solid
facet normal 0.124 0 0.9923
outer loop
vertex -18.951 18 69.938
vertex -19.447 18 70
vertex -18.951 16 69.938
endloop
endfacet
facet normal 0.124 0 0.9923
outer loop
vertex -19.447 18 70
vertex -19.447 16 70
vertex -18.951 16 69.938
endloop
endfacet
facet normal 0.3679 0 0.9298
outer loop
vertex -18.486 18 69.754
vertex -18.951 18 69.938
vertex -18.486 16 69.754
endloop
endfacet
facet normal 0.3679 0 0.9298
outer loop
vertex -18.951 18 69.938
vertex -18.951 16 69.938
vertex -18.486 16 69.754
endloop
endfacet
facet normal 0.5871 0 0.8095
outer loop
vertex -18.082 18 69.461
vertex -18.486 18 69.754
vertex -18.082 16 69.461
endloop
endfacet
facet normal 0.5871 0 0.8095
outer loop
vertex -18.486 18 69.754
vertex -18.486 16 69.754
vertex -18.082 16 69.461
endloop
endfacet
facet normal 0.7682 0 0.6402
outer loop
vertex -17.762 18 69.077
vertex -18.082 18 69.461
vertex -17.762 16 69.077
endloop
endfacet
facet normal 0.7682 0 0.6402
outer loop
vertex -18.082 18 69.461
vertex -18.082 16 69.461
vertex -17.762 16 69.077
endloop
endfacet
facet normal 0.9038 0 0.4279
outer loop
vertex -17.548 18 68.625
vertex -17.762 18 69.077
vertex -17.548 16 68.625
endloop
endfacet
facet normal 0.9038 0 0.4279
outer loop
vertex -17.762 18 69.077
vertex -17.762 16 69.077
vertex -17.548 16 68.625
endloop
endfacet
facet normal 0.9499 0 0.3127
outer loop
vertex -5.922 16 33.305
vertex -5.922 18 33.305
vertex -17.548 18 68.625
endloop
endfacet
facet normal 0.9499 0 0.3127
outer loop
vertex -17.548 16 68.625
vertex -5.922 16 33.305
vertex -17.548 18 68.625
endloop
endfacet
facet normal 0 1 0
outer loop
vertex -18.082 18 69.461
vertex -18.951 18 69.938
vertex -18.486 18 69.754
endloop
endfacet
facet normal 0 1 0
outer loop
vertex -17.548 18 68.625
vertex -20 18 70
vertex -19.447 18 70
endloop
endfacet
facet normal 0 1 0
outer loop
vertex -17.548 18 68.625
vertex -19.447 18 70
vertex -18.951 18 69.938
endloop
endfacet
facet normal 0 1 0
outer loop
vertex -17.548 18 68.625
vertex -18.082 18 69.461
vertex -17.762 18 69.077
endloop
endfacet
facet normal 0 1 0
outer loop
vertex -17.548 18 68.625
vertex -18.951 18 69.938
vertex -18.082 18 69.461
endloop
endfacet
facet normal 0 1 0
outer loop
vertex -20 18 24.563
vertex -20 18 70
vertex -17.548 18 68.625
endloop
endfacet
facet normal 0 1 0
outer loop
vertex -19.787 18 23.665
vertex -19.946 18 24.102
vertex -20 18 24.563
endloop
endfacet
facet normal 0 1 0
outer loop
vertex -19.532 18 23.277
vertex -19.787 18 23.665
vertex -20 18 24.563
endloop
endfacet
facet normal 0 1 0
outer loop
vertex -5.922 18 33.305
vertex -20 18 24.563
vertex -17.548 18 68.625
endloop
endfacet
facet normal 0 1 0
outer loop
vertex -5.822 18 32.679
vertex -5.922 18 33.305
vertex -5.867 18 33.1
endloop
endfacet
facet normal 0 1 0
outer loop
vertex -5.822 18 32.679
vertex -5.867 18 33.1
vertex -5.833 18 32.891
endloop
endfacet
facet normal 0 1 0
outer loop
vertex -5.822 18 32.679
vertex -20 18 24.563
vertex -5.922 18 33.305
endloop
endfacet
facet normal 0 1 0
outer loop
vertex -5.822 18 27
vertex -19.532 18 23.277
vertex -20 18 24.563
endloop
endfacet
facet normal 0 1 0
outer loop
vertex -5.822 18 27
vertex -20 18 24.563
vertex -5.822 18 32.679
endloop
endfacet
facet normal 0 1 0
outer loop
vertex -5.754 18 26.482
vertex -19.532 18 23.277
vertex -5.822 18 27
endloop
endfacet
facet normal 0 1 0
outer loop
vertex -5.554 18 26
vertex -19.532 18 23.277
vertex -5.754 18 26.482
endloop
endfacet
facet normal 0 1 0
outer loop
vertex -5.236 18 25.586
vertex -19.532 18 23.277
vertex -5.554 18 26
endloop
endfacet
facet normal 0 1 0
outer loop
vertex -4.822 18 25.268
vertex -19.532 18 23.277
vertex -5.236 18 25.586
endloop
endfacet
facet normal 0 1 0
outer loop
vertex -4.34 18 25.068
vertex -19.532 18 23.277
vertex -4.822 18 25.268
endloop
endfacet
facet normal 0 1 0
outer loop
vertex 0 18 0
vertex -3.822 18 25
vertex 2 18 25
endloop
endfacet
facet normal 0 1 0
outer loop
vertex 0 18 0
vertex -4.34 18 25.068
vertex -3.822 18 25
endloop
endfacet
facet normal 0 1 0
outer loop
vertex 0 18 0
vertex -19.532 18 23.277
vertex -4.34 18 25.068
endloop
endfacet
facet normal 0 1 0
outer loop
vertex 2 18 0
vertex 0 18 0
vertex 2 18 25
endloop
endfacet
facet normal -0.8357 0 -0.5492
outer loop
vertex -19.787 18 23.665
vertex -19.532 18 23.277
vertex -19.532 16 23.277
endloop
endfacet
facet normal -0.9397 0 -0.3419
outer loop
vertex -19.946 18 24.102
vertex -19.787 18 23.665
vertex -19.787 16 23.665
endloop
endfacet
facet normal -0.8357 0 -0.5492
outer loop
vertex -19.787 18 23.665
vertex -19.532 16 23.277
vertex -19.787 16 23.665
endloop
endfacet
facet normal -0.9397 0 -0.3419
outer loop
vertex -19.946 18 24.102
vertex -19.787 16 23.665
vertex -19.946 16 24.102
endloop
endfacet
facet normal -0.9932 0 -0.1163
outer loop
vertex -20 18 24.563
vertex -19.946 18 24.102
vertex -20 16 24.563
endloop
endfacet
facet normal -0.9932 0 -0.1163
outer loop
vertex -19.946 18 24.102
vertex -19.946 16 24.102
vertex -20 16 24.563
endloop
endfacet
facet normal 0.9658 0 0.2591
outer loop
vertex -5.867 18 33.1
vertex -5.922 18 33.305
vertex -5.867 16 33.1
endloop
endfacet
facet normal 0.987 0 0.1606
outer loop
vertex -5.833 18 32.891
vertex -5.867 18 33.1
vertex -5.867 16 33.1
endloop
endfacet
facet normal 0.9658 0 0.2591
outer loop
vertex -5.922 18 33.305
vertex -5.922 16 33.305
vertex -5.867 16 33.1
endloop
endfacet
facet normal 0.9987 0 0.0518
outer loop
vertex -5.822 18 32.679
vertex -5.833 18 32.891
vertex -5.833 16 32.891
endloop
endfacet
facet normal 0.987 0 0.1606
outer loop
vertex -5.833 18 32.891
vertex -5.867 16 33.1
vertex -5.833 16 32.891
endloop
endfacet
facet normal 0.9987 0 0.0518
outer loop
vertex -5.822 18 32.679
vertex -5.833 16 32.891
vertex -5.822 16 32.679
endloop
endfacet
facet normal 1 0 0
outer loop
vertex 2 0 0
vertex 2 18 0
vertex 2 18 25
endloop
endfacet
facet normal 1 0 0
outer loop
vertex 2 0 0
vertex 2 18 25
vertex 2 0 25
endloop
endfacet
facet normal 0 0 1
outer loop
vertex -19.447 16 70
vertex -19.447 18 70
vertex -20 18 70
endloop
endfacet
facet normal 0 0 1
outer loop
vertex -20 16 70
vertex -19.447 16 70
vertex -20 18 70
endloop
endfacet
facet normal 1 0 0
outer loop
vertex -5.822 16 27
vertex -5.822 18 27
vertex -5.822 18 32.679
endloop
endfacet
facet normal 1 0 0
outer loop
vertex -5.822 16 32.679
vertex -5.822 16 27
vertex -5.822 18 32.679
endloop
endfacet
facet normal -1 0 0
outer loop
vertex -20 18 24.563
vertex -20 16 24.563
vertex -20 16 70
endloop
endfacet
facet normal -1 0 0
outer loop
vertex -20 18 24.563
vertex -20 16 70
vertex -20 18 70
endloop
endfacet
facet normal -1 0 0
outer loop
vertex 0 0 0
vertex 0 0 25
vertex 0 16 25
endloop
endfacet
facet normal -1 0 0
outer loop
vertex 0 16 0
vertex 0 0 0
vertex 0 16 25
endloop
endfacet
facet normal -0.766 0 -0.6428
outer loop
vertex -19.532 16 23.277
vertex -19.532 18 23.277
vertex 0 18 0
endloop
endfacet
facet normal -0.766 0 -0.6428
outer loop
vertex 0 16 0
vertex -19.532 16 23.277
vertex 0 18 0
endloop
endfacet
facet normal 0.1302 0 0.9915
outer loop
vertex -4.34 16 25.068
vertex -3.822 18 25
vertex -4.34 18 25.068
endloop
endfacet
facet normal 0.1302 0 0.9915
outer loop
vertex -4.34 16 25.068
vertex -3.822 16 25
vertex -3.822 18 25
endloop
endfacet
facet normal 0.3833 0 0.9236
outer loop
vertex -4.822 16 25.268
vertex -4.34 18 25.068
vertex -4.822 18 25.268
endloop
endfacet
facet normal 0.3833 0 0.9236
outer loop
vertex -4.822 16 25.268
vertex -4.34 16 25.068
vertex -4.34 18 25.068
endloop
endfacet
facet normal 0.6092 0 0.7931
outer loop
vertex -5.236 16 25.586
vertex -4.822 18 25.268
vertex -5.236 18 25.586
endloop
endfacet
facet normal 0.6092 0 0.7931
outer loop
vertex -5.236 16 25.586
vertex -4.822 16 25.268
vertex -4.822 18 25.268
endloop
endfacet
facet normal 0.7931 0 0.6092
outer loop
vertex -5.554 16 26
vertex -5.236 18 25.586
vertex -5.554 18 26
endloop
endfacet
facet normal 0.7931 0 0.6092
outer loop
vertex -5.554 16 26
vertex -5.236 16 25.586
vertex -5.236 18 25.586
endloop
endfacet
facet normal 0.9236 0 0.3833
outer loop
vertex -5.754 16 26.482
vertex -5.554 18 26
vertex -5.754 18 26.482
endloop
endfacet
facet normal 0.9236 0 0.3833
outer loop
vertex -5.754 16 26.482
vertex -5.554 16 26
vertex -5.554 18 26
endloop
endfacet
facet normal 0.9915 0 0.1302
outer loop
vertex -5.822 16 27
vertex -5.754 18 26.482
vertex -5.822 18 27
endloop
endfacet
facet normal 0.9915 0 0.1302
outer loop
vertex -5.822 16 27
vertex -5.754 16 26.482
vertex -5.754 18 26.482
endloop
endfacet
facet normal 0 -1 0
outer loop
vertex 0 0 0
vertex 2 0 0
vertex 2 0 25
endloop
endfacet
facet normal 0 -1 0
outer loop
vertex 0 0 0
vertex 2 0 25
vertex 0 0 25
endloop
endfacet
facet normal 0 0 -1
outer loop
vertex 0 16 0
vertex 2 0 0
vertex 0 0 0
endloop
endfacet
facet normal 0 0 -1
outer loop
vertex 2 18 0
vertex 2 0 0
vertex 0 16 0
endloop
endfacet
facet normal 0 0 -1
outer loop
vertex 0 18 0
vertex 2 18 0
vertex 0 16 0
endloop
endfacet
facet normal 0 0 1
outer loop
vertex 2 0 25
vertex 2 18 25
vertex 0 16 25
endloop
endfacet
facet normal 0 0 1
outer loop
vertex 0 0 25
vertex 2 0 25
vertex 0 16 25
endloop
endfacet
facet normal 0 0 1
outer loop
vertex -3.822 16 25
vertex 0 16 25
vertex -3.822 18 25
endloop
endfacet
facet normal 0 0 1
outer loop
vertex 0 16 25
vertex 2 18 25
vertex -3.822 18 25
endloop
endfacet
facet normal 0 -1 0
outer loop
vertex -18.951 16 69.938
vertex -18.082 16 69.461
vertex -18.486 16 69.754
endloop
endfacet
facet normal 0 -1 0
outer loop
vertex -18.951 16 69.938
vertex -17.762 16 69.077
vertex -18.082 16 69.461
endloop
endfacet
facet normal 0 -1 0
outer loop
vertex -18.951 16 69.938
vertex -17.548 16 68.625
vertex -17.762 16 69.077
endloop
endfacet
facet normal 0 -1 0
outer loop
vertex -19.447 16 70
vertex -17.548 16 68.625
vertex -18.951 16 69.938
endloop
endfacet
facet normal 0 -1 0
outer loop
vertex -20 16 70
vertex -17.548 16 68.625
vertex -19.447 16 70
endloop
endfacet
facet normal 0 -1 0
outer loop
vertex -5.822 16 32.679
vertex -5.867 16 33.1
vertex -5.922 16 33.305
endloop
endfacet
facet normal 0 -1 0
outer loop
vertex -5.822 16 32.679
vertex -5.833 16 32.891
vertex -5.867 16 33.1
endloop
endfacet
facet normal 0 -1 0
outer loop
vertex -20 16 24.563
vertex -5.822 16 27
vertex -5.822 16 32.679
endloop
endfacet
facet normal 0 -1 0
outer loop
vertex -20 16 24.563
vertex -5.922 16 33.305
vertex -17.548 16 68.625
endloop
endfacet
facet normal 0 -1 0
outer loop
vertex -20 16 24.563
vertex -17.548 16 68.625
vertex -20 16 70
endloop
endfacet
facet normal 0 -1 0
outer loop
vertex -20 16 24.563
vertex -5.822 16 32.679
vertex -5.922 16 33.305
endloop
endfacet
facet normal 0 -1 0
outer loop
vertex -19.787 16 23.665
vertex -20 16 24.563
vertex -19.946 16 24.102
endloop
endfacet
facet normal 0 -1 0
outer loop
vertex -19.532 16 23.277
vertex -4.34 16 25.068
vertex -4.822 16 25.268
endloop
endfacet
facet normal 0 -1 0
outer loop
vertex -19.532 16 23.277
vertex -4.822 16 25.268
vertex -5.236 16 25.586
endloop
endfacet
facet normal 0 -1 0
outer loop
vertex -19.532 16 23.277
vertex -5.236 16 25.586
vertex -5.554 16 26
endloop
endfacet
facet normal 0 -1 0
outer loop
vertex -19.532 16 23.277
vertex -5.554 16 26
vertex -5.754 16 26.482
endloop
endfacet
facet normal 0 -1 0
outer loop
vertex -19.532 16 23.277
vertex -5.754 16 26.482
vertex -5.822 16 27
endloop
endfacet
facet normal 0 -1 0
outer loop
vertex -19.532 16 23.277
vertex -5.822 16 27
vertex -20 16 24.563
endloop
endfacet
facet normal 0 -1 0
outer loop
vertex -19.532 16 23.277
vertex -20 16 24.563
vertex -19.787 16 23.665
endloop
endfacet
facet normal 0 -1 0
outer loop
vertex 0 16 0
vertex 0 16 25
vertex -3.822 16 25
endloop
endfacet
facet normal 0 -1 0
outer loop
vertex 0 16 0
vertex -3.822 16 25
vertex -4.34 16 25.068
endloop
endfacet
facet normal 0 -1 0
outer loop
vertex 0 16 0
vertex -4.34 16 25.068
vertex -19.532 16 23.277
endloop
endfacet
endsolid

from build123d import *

# Parameters (mm, degrees)
EXTRUDE_THIN1_DEPTH = 70
CUT_EXTRUDE1_DEPTH  = 19
CUT_EXTRUDE2_DEPTH  = 19
FILLET1_R           = 2


with BuildPart() as part:
    # Sketch1 → Extrude-Thin1 (new body)
    with BuildSketch(Plane.XY):
        Polygon((0, 0), (0, 16), (-20, 16), (-20, 18), (2, 18), (2, 0), align=None)
    extrude(amount=EXTRUDE_THIN1_DEPTH)

    # Sketch2 → Cut-Extrude1 (cut, through all)
    with BuildSketch(Plane(origin=(0, 18, 0), x_dir=(1, 0, 0), z_dir=(0, 1, 0))):
        Polygon((2, -25), (-5.822, -25), (-5.822, -33), (-18, -70), (2, -70), align=None)
    extrude(amount=-CUT_EXTRUDE1_DEPTH, mode=Mode.SUBTRACT)

    # Sketch3 → Cut-Extrude2 (cut, through all)
    with BuildSketch(Plane(origin=(0, 18, 0), x_dir=(1, 0, 0), z_dir=(0, 1, 0))):
        Polygon((-20, -23.835071852), (0, 0), (-20, 0), align=None)
    extrude(amount=-CUT_EXTRUDE2_DEPTH, mode=Mode.SUBTRACT)

    # Fillet1
    fillet1_edges = [part.edges().sort_by_distance(p)[0] for p in [
        (-18, 17, 70),
        (-5.822, 17, 33),
        (-5.822, 17, 25),
        (-20, 17, 23.835071852),
    ]]
    fillet(fillet1_edges, radius=FILLET1_R)


solid = part.part
